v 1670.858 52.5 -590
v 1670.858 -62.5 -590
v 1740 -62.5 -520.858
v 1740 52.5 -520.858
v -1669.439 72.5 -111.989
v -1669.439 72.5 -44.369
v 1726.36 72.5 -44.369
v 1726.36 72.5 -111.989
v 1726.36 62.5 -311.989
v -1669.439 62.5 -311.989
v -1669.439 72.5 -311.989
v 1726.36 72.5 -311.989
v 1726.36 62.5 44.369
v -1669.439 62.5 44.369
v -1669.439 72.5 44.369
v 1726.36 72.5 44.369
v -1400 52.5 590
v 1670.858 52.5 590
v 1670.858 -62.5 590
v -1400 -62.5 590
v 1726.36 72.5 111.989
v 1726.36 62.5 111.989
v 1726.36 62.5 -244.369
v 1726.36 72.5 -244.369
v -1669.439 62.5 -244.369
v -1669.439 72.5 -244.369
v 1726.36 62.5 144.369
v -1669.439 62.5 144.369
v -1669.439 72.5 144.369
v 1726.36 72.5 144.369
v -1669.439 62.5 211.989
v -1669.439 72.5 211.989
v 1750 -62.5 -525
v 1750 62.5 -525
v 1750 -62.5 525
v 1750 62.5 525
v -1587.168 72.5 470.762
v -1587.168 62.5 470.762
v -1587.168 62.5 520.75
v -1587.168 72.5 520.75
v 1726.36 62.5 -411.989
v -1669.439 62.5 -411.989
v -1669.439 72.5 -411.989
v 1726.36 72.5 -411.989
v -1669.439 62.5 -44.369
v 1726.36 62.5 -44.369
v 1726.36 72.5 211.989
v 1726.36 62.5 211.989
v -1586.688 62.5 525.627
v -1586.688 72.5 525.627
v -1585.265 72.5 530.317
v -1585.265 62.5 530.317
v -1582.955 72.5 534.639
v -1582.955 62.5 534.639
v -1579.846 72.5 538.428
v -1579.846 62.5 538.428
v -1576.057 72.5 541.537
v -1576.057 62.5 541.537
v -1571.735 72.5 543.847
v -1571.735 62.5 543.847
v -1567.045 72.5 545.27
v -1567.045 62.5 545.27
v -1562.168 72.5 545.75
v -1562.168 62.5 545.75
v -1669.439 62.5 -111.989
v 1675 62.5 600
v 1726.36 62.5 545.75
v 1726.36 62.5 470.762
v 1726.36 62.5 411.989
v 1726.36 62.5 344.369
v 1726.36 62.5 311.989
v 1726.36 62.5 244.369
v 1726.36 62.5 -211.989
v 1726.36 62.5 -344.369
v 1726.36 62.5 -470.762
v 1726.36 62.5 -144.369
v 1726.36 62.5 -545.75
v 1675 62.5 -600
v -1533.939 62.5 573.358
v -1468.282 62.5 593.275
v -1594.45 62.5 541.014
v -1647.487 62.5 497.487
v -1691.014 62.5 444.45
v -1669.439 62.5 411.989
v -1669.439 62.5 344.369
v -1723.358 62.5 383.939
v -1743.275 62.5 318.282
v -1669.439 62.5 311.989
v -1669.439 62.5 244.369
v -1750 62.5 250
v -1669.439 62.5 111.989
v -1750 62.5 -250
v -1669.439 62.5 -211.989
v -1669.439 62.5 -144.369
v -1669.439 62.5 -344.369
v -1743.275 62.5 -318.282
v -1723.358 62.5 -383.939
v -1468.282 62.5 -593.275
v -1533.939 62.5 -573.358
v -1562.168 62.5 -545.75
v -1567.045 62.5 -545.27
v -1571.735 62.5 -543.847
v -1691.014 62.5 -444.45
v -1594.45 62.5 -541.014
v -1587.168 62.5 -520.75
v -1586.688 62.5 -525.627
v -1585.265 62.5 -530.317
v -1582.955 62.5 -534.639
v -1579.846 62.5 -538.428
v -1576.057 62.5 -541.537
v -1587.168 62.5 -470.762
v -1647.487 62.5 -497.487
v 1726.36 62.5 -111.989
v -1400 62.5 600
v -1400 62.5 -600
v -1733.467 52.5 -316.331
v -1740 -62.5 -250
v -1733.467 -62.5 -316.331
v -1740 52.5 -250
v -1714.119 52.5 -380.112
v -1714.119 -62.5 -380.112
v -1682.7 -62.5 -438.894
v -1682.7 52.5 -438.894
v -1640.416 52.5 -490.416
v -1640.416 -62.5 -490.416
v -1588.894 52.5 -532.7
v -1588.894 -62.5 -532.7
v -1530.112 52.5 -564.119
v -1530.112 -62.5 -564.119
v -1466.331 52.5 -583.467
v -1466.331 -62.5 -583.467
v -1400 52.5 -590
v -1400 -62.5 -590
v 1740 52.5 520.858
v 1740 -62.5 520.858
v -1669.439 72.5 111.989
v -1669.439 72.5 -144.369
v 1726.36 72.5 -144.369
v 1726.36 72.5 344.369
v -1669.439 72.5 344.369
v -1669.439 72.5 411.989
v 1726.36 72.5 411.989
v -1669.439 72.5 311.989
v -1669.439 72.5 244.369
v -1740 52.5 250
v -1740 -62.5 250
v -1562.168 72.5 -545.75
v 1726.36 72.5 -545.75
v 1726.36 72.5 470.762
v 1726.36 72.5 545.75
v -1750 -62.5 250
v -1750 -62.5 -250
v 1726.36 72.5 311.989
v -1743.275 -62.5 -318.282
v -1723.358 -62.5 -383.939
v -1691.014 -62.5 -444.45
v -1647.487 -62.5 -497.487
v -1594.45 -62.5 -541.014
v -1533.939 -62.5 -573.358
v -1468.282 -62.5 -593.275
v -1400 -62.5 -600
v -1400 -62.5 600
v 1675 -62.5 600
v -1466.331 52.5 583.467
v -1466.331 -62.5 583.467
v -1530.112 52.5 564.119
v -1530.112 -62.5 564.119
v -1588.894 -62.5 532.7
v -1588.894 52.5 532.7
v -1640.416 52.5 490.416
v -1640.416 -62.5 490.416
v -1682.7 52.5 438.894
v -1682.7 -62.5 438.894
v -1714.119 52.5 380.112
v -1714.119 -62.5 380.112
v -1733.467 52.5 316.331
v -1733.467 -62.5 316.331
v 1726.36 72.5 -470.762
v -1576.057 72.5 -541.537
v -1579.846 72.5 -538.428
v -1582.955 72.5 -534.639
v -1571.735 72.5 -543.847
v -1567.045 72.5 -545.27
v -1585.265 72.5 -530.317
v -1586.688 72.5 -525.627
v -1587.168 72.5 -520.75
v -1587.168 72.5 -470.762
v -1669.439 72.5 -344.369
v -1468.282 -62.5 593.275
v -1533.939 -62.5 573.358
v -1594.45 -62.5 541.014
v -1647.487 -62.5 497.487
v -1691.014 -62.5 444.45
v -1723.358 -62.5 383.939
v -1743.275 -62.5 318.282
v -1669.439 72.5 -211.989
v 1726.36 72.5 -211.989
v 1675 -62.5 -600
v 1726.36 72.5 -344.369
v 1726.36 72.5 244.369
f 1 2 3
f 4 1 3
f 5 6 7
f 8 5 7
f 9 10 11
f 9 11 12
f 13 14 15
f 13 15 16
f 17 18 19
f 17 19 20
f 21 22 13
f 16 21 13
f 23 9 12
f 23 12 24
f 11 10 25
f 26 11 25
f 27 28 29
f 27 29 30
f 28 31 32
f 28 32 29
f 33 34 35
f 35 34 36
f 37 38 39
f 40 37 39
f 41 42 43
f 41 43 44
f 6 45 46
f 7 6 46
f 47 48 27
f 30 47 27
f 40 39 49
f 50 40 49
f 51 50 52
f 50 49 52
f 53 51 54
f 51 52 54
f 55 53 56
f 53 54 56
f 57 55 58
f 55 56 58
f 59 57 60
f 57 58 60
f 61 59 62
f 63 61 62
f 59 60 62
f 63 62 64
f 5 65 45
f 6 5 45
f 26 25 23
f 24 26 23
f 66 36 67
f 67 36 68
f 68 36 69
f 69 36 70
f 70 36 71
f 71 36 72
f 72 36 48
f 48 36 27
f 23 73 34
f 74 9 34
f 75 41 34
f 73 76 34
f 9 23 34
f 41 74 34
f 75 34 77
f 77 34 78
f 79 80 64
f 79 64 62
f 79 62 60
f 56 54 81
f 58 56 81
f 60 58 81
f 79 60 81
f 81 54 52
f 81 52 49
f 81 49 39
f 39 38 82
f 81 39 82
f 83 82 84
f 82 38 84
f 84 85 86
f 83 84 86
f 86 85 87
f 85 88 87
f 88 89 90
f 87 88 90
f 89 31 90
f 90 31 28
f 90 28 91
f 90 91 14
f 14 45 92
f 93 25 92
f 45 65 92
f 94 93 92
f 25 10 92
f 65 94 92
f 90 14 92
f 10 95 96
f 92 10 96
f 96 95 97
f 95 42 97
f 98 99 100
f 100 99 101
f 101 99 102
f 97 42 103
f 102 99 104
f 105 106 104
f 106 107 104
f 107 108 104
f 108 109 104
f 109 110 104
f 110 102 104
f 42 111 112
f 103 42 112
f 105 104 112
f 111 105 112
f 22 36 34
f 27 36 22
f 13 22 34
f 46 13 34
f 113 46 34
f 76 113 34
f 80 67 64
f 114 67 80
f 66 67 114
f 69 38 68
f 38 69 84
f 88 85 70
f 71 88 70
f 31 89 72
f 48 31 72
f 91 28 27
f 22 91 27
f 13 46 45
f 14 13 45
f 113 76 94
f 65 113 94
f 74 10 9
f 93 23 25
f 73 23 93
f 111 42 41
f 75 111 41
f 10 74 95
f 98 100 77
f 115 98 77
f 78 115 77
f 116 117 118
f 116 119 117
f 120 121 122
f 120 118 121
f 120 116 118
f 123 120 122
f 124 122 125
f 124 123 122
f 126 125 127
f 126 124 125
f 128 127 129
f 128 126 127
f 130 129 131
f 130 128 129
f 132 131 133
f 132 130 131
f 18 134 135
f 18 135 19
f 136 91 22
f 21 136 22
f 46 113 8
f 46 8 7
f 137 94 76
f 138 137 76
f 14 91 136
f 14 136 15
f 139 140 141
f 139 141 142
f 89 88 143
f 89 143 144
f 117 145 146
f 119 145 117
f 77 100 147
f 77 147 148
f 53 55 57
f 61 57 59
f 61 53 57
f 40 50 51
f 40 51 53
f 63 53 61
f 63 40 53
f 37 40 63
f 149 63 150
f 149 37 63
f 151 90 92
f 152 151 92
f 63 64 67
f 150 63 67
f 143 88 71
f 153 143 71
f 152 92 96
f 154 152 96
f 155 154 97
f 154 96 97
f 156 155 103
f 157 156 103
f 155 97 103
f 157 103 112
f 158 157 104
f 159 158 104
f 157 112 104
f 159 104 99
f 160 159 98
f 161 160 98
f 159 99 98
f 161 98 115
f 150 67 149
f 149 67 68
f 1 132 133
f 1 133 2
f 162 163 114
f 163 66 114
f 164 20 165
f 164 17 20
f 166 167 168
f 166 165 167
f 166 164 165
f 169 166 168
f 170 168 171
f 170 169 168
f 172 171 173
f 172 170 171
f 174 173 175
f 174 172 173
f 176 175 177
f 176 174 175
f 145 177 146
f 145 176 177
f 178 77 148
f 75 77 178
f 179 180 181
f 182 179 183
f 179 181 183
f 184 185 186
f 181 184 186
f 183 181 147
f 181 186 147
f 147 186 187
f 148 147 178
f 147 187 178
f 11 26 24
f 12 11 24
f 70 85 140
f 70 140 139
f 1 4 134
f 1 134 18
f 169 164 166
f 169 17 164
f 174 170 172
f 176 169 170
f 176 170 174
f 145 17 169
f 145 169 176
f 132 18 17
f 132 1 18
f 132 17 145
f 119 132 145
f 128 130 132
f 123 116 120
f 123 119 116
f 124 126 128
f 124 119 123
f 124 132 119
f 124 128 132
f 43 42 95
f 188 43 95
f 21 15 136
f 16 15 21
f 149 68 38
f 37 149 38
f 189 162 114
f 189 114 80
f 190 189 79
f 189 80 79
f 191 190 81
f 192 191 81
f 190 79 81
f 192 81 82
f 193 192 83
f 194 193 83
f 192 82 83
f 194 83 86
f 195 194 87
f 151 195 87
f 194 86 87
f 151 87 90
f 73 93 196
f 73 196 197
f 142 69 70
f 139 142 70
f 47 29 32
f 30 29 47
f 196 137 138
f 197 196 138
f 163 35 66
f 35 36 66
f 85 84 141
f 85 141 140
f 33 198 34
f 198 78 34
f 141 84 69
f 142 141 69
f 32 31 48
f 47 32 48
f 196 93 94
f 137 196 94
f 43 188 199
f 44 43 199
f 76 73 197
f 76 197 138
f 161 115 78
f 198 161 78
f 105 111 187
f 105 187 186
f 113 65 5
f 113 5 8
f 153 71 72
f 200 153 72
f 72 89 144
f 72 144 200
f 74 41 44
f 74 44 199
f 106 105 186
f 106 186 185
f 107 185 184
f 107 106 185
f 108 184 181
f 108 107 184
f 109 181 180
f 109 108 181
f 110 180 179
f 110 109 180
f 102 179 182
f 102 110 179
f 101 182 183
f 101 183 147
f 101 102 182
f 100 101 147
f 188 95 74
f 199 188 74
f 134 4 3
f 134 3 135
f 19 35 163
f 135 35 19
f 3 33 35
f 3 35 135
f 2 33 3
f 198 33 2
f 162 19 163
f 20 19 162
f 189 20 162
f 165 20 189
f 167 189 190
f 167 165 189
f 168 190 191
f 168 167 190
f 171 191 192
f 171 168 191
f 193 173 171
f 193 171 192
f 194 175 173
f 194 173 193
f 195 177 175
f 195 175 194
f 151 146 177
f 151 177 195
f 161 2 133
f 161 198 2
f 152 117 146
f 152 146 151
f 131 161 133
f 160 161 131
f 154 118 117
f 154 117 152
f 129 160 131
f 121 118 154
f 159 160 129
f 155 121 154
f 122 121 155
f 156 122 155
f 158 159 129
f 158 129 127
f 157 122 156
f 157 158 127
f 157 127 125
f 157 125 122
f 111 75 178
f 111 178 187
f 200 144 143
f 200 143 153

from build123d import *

# Parameters (mm, degrees)
BOSS_EXTRUDE1_DEPTH = 62.5
SHELL1_T            = -10
SKETCH2_W           = 3395.798784502
SKETCH2_H           = 67.61947807
BOSS_EXTRUDE2_DEPTH = 10


with BuildPart() as part:
    # Sketch1 → Boss-Extrude1 (new, symmetric)
    with BuildSketch(Plane(origin=(0, 0, 0), x_dir=(1, 0, 0), z_dir=(0, 1, 0))):
        with BuildLine():
            Line((-1400, 600), (1675, 600))
            Line((1675, 600), (1750, 525))
            Line((1750, 525), (1750, -525))
            Line((1750, -525), (1675, -600))
            Line((1675, -600), (-1400, -600))
            ThreePointArc((-1400, -600), (-1647.487373415, -497.487373415), (-1750, -250))
            Line((-1750, -250), (-1750, 250))
            ThreePointArc((-1750, 250), (-1647.487373415, 497.487373415), (-1400, 600))
        make_face()
    extrude(amount=BOSS_EXTRUDE1_DEPTH, both=True)

    # Shell1
    shell1_openings = [part.faces().sort_by_distance(p)[0] for p in [
        (18.879959891, -62.5, 0),
    ]]
    offset(amount=SHELL1_T, openings=shell1_openings, kind=Kind.INTERSECTION)

    # Sketch2 → Boss-Extrude2 (add)
    with BuildSketch(Plane(origin=(0, 62.5, 0), x_dir=(1, 0, 0), z_dir=(0, 1, 0))):
        with Locations((28.460206267, -278.179088726)):
            Rectangle(SKETCH2_W, SKETCH2_H)
        with BuildLine():
            Line((-1562.167945827, -545.750164928), (1726.359598518, -545.750164928))
            Line((1726.359598518, -545.750164928), (1726.359598518, -470.762339089))
            Line((1726.359598518, -470.762339089), (-1587.167945827, -470.762339089))
            Line((-1587.167945827, -470.762339089), (-1587.167945827, -520.750164928))
            ThreePointArc((-1587.167945827, -520.750164928), (-1579.845615357, -538.427834457), (-1562.167945827, -545.750164928))
        make_face()
        with Locations((28.460206267, -378.179088726)):
            Rectangle(SKETCH2_W, SKETCH2_H)
        with Locations((28.460206267, -178.179088726)):
            Rectangle(SKETCH2_W, SKETCH2_H)
        with Locations((28.460206267, -78.179088726)):
            Rectangle(SKETCH2_W, SKETCH2_H)
    boss_extrude2 = extrude(amount=BOSS_EXTRUDE2_DEPTH)

    # Mirror1: Boss-Extrude2 across plane
    add(boss_extrude2.mirror(Plane.XY))


solid = part.part
